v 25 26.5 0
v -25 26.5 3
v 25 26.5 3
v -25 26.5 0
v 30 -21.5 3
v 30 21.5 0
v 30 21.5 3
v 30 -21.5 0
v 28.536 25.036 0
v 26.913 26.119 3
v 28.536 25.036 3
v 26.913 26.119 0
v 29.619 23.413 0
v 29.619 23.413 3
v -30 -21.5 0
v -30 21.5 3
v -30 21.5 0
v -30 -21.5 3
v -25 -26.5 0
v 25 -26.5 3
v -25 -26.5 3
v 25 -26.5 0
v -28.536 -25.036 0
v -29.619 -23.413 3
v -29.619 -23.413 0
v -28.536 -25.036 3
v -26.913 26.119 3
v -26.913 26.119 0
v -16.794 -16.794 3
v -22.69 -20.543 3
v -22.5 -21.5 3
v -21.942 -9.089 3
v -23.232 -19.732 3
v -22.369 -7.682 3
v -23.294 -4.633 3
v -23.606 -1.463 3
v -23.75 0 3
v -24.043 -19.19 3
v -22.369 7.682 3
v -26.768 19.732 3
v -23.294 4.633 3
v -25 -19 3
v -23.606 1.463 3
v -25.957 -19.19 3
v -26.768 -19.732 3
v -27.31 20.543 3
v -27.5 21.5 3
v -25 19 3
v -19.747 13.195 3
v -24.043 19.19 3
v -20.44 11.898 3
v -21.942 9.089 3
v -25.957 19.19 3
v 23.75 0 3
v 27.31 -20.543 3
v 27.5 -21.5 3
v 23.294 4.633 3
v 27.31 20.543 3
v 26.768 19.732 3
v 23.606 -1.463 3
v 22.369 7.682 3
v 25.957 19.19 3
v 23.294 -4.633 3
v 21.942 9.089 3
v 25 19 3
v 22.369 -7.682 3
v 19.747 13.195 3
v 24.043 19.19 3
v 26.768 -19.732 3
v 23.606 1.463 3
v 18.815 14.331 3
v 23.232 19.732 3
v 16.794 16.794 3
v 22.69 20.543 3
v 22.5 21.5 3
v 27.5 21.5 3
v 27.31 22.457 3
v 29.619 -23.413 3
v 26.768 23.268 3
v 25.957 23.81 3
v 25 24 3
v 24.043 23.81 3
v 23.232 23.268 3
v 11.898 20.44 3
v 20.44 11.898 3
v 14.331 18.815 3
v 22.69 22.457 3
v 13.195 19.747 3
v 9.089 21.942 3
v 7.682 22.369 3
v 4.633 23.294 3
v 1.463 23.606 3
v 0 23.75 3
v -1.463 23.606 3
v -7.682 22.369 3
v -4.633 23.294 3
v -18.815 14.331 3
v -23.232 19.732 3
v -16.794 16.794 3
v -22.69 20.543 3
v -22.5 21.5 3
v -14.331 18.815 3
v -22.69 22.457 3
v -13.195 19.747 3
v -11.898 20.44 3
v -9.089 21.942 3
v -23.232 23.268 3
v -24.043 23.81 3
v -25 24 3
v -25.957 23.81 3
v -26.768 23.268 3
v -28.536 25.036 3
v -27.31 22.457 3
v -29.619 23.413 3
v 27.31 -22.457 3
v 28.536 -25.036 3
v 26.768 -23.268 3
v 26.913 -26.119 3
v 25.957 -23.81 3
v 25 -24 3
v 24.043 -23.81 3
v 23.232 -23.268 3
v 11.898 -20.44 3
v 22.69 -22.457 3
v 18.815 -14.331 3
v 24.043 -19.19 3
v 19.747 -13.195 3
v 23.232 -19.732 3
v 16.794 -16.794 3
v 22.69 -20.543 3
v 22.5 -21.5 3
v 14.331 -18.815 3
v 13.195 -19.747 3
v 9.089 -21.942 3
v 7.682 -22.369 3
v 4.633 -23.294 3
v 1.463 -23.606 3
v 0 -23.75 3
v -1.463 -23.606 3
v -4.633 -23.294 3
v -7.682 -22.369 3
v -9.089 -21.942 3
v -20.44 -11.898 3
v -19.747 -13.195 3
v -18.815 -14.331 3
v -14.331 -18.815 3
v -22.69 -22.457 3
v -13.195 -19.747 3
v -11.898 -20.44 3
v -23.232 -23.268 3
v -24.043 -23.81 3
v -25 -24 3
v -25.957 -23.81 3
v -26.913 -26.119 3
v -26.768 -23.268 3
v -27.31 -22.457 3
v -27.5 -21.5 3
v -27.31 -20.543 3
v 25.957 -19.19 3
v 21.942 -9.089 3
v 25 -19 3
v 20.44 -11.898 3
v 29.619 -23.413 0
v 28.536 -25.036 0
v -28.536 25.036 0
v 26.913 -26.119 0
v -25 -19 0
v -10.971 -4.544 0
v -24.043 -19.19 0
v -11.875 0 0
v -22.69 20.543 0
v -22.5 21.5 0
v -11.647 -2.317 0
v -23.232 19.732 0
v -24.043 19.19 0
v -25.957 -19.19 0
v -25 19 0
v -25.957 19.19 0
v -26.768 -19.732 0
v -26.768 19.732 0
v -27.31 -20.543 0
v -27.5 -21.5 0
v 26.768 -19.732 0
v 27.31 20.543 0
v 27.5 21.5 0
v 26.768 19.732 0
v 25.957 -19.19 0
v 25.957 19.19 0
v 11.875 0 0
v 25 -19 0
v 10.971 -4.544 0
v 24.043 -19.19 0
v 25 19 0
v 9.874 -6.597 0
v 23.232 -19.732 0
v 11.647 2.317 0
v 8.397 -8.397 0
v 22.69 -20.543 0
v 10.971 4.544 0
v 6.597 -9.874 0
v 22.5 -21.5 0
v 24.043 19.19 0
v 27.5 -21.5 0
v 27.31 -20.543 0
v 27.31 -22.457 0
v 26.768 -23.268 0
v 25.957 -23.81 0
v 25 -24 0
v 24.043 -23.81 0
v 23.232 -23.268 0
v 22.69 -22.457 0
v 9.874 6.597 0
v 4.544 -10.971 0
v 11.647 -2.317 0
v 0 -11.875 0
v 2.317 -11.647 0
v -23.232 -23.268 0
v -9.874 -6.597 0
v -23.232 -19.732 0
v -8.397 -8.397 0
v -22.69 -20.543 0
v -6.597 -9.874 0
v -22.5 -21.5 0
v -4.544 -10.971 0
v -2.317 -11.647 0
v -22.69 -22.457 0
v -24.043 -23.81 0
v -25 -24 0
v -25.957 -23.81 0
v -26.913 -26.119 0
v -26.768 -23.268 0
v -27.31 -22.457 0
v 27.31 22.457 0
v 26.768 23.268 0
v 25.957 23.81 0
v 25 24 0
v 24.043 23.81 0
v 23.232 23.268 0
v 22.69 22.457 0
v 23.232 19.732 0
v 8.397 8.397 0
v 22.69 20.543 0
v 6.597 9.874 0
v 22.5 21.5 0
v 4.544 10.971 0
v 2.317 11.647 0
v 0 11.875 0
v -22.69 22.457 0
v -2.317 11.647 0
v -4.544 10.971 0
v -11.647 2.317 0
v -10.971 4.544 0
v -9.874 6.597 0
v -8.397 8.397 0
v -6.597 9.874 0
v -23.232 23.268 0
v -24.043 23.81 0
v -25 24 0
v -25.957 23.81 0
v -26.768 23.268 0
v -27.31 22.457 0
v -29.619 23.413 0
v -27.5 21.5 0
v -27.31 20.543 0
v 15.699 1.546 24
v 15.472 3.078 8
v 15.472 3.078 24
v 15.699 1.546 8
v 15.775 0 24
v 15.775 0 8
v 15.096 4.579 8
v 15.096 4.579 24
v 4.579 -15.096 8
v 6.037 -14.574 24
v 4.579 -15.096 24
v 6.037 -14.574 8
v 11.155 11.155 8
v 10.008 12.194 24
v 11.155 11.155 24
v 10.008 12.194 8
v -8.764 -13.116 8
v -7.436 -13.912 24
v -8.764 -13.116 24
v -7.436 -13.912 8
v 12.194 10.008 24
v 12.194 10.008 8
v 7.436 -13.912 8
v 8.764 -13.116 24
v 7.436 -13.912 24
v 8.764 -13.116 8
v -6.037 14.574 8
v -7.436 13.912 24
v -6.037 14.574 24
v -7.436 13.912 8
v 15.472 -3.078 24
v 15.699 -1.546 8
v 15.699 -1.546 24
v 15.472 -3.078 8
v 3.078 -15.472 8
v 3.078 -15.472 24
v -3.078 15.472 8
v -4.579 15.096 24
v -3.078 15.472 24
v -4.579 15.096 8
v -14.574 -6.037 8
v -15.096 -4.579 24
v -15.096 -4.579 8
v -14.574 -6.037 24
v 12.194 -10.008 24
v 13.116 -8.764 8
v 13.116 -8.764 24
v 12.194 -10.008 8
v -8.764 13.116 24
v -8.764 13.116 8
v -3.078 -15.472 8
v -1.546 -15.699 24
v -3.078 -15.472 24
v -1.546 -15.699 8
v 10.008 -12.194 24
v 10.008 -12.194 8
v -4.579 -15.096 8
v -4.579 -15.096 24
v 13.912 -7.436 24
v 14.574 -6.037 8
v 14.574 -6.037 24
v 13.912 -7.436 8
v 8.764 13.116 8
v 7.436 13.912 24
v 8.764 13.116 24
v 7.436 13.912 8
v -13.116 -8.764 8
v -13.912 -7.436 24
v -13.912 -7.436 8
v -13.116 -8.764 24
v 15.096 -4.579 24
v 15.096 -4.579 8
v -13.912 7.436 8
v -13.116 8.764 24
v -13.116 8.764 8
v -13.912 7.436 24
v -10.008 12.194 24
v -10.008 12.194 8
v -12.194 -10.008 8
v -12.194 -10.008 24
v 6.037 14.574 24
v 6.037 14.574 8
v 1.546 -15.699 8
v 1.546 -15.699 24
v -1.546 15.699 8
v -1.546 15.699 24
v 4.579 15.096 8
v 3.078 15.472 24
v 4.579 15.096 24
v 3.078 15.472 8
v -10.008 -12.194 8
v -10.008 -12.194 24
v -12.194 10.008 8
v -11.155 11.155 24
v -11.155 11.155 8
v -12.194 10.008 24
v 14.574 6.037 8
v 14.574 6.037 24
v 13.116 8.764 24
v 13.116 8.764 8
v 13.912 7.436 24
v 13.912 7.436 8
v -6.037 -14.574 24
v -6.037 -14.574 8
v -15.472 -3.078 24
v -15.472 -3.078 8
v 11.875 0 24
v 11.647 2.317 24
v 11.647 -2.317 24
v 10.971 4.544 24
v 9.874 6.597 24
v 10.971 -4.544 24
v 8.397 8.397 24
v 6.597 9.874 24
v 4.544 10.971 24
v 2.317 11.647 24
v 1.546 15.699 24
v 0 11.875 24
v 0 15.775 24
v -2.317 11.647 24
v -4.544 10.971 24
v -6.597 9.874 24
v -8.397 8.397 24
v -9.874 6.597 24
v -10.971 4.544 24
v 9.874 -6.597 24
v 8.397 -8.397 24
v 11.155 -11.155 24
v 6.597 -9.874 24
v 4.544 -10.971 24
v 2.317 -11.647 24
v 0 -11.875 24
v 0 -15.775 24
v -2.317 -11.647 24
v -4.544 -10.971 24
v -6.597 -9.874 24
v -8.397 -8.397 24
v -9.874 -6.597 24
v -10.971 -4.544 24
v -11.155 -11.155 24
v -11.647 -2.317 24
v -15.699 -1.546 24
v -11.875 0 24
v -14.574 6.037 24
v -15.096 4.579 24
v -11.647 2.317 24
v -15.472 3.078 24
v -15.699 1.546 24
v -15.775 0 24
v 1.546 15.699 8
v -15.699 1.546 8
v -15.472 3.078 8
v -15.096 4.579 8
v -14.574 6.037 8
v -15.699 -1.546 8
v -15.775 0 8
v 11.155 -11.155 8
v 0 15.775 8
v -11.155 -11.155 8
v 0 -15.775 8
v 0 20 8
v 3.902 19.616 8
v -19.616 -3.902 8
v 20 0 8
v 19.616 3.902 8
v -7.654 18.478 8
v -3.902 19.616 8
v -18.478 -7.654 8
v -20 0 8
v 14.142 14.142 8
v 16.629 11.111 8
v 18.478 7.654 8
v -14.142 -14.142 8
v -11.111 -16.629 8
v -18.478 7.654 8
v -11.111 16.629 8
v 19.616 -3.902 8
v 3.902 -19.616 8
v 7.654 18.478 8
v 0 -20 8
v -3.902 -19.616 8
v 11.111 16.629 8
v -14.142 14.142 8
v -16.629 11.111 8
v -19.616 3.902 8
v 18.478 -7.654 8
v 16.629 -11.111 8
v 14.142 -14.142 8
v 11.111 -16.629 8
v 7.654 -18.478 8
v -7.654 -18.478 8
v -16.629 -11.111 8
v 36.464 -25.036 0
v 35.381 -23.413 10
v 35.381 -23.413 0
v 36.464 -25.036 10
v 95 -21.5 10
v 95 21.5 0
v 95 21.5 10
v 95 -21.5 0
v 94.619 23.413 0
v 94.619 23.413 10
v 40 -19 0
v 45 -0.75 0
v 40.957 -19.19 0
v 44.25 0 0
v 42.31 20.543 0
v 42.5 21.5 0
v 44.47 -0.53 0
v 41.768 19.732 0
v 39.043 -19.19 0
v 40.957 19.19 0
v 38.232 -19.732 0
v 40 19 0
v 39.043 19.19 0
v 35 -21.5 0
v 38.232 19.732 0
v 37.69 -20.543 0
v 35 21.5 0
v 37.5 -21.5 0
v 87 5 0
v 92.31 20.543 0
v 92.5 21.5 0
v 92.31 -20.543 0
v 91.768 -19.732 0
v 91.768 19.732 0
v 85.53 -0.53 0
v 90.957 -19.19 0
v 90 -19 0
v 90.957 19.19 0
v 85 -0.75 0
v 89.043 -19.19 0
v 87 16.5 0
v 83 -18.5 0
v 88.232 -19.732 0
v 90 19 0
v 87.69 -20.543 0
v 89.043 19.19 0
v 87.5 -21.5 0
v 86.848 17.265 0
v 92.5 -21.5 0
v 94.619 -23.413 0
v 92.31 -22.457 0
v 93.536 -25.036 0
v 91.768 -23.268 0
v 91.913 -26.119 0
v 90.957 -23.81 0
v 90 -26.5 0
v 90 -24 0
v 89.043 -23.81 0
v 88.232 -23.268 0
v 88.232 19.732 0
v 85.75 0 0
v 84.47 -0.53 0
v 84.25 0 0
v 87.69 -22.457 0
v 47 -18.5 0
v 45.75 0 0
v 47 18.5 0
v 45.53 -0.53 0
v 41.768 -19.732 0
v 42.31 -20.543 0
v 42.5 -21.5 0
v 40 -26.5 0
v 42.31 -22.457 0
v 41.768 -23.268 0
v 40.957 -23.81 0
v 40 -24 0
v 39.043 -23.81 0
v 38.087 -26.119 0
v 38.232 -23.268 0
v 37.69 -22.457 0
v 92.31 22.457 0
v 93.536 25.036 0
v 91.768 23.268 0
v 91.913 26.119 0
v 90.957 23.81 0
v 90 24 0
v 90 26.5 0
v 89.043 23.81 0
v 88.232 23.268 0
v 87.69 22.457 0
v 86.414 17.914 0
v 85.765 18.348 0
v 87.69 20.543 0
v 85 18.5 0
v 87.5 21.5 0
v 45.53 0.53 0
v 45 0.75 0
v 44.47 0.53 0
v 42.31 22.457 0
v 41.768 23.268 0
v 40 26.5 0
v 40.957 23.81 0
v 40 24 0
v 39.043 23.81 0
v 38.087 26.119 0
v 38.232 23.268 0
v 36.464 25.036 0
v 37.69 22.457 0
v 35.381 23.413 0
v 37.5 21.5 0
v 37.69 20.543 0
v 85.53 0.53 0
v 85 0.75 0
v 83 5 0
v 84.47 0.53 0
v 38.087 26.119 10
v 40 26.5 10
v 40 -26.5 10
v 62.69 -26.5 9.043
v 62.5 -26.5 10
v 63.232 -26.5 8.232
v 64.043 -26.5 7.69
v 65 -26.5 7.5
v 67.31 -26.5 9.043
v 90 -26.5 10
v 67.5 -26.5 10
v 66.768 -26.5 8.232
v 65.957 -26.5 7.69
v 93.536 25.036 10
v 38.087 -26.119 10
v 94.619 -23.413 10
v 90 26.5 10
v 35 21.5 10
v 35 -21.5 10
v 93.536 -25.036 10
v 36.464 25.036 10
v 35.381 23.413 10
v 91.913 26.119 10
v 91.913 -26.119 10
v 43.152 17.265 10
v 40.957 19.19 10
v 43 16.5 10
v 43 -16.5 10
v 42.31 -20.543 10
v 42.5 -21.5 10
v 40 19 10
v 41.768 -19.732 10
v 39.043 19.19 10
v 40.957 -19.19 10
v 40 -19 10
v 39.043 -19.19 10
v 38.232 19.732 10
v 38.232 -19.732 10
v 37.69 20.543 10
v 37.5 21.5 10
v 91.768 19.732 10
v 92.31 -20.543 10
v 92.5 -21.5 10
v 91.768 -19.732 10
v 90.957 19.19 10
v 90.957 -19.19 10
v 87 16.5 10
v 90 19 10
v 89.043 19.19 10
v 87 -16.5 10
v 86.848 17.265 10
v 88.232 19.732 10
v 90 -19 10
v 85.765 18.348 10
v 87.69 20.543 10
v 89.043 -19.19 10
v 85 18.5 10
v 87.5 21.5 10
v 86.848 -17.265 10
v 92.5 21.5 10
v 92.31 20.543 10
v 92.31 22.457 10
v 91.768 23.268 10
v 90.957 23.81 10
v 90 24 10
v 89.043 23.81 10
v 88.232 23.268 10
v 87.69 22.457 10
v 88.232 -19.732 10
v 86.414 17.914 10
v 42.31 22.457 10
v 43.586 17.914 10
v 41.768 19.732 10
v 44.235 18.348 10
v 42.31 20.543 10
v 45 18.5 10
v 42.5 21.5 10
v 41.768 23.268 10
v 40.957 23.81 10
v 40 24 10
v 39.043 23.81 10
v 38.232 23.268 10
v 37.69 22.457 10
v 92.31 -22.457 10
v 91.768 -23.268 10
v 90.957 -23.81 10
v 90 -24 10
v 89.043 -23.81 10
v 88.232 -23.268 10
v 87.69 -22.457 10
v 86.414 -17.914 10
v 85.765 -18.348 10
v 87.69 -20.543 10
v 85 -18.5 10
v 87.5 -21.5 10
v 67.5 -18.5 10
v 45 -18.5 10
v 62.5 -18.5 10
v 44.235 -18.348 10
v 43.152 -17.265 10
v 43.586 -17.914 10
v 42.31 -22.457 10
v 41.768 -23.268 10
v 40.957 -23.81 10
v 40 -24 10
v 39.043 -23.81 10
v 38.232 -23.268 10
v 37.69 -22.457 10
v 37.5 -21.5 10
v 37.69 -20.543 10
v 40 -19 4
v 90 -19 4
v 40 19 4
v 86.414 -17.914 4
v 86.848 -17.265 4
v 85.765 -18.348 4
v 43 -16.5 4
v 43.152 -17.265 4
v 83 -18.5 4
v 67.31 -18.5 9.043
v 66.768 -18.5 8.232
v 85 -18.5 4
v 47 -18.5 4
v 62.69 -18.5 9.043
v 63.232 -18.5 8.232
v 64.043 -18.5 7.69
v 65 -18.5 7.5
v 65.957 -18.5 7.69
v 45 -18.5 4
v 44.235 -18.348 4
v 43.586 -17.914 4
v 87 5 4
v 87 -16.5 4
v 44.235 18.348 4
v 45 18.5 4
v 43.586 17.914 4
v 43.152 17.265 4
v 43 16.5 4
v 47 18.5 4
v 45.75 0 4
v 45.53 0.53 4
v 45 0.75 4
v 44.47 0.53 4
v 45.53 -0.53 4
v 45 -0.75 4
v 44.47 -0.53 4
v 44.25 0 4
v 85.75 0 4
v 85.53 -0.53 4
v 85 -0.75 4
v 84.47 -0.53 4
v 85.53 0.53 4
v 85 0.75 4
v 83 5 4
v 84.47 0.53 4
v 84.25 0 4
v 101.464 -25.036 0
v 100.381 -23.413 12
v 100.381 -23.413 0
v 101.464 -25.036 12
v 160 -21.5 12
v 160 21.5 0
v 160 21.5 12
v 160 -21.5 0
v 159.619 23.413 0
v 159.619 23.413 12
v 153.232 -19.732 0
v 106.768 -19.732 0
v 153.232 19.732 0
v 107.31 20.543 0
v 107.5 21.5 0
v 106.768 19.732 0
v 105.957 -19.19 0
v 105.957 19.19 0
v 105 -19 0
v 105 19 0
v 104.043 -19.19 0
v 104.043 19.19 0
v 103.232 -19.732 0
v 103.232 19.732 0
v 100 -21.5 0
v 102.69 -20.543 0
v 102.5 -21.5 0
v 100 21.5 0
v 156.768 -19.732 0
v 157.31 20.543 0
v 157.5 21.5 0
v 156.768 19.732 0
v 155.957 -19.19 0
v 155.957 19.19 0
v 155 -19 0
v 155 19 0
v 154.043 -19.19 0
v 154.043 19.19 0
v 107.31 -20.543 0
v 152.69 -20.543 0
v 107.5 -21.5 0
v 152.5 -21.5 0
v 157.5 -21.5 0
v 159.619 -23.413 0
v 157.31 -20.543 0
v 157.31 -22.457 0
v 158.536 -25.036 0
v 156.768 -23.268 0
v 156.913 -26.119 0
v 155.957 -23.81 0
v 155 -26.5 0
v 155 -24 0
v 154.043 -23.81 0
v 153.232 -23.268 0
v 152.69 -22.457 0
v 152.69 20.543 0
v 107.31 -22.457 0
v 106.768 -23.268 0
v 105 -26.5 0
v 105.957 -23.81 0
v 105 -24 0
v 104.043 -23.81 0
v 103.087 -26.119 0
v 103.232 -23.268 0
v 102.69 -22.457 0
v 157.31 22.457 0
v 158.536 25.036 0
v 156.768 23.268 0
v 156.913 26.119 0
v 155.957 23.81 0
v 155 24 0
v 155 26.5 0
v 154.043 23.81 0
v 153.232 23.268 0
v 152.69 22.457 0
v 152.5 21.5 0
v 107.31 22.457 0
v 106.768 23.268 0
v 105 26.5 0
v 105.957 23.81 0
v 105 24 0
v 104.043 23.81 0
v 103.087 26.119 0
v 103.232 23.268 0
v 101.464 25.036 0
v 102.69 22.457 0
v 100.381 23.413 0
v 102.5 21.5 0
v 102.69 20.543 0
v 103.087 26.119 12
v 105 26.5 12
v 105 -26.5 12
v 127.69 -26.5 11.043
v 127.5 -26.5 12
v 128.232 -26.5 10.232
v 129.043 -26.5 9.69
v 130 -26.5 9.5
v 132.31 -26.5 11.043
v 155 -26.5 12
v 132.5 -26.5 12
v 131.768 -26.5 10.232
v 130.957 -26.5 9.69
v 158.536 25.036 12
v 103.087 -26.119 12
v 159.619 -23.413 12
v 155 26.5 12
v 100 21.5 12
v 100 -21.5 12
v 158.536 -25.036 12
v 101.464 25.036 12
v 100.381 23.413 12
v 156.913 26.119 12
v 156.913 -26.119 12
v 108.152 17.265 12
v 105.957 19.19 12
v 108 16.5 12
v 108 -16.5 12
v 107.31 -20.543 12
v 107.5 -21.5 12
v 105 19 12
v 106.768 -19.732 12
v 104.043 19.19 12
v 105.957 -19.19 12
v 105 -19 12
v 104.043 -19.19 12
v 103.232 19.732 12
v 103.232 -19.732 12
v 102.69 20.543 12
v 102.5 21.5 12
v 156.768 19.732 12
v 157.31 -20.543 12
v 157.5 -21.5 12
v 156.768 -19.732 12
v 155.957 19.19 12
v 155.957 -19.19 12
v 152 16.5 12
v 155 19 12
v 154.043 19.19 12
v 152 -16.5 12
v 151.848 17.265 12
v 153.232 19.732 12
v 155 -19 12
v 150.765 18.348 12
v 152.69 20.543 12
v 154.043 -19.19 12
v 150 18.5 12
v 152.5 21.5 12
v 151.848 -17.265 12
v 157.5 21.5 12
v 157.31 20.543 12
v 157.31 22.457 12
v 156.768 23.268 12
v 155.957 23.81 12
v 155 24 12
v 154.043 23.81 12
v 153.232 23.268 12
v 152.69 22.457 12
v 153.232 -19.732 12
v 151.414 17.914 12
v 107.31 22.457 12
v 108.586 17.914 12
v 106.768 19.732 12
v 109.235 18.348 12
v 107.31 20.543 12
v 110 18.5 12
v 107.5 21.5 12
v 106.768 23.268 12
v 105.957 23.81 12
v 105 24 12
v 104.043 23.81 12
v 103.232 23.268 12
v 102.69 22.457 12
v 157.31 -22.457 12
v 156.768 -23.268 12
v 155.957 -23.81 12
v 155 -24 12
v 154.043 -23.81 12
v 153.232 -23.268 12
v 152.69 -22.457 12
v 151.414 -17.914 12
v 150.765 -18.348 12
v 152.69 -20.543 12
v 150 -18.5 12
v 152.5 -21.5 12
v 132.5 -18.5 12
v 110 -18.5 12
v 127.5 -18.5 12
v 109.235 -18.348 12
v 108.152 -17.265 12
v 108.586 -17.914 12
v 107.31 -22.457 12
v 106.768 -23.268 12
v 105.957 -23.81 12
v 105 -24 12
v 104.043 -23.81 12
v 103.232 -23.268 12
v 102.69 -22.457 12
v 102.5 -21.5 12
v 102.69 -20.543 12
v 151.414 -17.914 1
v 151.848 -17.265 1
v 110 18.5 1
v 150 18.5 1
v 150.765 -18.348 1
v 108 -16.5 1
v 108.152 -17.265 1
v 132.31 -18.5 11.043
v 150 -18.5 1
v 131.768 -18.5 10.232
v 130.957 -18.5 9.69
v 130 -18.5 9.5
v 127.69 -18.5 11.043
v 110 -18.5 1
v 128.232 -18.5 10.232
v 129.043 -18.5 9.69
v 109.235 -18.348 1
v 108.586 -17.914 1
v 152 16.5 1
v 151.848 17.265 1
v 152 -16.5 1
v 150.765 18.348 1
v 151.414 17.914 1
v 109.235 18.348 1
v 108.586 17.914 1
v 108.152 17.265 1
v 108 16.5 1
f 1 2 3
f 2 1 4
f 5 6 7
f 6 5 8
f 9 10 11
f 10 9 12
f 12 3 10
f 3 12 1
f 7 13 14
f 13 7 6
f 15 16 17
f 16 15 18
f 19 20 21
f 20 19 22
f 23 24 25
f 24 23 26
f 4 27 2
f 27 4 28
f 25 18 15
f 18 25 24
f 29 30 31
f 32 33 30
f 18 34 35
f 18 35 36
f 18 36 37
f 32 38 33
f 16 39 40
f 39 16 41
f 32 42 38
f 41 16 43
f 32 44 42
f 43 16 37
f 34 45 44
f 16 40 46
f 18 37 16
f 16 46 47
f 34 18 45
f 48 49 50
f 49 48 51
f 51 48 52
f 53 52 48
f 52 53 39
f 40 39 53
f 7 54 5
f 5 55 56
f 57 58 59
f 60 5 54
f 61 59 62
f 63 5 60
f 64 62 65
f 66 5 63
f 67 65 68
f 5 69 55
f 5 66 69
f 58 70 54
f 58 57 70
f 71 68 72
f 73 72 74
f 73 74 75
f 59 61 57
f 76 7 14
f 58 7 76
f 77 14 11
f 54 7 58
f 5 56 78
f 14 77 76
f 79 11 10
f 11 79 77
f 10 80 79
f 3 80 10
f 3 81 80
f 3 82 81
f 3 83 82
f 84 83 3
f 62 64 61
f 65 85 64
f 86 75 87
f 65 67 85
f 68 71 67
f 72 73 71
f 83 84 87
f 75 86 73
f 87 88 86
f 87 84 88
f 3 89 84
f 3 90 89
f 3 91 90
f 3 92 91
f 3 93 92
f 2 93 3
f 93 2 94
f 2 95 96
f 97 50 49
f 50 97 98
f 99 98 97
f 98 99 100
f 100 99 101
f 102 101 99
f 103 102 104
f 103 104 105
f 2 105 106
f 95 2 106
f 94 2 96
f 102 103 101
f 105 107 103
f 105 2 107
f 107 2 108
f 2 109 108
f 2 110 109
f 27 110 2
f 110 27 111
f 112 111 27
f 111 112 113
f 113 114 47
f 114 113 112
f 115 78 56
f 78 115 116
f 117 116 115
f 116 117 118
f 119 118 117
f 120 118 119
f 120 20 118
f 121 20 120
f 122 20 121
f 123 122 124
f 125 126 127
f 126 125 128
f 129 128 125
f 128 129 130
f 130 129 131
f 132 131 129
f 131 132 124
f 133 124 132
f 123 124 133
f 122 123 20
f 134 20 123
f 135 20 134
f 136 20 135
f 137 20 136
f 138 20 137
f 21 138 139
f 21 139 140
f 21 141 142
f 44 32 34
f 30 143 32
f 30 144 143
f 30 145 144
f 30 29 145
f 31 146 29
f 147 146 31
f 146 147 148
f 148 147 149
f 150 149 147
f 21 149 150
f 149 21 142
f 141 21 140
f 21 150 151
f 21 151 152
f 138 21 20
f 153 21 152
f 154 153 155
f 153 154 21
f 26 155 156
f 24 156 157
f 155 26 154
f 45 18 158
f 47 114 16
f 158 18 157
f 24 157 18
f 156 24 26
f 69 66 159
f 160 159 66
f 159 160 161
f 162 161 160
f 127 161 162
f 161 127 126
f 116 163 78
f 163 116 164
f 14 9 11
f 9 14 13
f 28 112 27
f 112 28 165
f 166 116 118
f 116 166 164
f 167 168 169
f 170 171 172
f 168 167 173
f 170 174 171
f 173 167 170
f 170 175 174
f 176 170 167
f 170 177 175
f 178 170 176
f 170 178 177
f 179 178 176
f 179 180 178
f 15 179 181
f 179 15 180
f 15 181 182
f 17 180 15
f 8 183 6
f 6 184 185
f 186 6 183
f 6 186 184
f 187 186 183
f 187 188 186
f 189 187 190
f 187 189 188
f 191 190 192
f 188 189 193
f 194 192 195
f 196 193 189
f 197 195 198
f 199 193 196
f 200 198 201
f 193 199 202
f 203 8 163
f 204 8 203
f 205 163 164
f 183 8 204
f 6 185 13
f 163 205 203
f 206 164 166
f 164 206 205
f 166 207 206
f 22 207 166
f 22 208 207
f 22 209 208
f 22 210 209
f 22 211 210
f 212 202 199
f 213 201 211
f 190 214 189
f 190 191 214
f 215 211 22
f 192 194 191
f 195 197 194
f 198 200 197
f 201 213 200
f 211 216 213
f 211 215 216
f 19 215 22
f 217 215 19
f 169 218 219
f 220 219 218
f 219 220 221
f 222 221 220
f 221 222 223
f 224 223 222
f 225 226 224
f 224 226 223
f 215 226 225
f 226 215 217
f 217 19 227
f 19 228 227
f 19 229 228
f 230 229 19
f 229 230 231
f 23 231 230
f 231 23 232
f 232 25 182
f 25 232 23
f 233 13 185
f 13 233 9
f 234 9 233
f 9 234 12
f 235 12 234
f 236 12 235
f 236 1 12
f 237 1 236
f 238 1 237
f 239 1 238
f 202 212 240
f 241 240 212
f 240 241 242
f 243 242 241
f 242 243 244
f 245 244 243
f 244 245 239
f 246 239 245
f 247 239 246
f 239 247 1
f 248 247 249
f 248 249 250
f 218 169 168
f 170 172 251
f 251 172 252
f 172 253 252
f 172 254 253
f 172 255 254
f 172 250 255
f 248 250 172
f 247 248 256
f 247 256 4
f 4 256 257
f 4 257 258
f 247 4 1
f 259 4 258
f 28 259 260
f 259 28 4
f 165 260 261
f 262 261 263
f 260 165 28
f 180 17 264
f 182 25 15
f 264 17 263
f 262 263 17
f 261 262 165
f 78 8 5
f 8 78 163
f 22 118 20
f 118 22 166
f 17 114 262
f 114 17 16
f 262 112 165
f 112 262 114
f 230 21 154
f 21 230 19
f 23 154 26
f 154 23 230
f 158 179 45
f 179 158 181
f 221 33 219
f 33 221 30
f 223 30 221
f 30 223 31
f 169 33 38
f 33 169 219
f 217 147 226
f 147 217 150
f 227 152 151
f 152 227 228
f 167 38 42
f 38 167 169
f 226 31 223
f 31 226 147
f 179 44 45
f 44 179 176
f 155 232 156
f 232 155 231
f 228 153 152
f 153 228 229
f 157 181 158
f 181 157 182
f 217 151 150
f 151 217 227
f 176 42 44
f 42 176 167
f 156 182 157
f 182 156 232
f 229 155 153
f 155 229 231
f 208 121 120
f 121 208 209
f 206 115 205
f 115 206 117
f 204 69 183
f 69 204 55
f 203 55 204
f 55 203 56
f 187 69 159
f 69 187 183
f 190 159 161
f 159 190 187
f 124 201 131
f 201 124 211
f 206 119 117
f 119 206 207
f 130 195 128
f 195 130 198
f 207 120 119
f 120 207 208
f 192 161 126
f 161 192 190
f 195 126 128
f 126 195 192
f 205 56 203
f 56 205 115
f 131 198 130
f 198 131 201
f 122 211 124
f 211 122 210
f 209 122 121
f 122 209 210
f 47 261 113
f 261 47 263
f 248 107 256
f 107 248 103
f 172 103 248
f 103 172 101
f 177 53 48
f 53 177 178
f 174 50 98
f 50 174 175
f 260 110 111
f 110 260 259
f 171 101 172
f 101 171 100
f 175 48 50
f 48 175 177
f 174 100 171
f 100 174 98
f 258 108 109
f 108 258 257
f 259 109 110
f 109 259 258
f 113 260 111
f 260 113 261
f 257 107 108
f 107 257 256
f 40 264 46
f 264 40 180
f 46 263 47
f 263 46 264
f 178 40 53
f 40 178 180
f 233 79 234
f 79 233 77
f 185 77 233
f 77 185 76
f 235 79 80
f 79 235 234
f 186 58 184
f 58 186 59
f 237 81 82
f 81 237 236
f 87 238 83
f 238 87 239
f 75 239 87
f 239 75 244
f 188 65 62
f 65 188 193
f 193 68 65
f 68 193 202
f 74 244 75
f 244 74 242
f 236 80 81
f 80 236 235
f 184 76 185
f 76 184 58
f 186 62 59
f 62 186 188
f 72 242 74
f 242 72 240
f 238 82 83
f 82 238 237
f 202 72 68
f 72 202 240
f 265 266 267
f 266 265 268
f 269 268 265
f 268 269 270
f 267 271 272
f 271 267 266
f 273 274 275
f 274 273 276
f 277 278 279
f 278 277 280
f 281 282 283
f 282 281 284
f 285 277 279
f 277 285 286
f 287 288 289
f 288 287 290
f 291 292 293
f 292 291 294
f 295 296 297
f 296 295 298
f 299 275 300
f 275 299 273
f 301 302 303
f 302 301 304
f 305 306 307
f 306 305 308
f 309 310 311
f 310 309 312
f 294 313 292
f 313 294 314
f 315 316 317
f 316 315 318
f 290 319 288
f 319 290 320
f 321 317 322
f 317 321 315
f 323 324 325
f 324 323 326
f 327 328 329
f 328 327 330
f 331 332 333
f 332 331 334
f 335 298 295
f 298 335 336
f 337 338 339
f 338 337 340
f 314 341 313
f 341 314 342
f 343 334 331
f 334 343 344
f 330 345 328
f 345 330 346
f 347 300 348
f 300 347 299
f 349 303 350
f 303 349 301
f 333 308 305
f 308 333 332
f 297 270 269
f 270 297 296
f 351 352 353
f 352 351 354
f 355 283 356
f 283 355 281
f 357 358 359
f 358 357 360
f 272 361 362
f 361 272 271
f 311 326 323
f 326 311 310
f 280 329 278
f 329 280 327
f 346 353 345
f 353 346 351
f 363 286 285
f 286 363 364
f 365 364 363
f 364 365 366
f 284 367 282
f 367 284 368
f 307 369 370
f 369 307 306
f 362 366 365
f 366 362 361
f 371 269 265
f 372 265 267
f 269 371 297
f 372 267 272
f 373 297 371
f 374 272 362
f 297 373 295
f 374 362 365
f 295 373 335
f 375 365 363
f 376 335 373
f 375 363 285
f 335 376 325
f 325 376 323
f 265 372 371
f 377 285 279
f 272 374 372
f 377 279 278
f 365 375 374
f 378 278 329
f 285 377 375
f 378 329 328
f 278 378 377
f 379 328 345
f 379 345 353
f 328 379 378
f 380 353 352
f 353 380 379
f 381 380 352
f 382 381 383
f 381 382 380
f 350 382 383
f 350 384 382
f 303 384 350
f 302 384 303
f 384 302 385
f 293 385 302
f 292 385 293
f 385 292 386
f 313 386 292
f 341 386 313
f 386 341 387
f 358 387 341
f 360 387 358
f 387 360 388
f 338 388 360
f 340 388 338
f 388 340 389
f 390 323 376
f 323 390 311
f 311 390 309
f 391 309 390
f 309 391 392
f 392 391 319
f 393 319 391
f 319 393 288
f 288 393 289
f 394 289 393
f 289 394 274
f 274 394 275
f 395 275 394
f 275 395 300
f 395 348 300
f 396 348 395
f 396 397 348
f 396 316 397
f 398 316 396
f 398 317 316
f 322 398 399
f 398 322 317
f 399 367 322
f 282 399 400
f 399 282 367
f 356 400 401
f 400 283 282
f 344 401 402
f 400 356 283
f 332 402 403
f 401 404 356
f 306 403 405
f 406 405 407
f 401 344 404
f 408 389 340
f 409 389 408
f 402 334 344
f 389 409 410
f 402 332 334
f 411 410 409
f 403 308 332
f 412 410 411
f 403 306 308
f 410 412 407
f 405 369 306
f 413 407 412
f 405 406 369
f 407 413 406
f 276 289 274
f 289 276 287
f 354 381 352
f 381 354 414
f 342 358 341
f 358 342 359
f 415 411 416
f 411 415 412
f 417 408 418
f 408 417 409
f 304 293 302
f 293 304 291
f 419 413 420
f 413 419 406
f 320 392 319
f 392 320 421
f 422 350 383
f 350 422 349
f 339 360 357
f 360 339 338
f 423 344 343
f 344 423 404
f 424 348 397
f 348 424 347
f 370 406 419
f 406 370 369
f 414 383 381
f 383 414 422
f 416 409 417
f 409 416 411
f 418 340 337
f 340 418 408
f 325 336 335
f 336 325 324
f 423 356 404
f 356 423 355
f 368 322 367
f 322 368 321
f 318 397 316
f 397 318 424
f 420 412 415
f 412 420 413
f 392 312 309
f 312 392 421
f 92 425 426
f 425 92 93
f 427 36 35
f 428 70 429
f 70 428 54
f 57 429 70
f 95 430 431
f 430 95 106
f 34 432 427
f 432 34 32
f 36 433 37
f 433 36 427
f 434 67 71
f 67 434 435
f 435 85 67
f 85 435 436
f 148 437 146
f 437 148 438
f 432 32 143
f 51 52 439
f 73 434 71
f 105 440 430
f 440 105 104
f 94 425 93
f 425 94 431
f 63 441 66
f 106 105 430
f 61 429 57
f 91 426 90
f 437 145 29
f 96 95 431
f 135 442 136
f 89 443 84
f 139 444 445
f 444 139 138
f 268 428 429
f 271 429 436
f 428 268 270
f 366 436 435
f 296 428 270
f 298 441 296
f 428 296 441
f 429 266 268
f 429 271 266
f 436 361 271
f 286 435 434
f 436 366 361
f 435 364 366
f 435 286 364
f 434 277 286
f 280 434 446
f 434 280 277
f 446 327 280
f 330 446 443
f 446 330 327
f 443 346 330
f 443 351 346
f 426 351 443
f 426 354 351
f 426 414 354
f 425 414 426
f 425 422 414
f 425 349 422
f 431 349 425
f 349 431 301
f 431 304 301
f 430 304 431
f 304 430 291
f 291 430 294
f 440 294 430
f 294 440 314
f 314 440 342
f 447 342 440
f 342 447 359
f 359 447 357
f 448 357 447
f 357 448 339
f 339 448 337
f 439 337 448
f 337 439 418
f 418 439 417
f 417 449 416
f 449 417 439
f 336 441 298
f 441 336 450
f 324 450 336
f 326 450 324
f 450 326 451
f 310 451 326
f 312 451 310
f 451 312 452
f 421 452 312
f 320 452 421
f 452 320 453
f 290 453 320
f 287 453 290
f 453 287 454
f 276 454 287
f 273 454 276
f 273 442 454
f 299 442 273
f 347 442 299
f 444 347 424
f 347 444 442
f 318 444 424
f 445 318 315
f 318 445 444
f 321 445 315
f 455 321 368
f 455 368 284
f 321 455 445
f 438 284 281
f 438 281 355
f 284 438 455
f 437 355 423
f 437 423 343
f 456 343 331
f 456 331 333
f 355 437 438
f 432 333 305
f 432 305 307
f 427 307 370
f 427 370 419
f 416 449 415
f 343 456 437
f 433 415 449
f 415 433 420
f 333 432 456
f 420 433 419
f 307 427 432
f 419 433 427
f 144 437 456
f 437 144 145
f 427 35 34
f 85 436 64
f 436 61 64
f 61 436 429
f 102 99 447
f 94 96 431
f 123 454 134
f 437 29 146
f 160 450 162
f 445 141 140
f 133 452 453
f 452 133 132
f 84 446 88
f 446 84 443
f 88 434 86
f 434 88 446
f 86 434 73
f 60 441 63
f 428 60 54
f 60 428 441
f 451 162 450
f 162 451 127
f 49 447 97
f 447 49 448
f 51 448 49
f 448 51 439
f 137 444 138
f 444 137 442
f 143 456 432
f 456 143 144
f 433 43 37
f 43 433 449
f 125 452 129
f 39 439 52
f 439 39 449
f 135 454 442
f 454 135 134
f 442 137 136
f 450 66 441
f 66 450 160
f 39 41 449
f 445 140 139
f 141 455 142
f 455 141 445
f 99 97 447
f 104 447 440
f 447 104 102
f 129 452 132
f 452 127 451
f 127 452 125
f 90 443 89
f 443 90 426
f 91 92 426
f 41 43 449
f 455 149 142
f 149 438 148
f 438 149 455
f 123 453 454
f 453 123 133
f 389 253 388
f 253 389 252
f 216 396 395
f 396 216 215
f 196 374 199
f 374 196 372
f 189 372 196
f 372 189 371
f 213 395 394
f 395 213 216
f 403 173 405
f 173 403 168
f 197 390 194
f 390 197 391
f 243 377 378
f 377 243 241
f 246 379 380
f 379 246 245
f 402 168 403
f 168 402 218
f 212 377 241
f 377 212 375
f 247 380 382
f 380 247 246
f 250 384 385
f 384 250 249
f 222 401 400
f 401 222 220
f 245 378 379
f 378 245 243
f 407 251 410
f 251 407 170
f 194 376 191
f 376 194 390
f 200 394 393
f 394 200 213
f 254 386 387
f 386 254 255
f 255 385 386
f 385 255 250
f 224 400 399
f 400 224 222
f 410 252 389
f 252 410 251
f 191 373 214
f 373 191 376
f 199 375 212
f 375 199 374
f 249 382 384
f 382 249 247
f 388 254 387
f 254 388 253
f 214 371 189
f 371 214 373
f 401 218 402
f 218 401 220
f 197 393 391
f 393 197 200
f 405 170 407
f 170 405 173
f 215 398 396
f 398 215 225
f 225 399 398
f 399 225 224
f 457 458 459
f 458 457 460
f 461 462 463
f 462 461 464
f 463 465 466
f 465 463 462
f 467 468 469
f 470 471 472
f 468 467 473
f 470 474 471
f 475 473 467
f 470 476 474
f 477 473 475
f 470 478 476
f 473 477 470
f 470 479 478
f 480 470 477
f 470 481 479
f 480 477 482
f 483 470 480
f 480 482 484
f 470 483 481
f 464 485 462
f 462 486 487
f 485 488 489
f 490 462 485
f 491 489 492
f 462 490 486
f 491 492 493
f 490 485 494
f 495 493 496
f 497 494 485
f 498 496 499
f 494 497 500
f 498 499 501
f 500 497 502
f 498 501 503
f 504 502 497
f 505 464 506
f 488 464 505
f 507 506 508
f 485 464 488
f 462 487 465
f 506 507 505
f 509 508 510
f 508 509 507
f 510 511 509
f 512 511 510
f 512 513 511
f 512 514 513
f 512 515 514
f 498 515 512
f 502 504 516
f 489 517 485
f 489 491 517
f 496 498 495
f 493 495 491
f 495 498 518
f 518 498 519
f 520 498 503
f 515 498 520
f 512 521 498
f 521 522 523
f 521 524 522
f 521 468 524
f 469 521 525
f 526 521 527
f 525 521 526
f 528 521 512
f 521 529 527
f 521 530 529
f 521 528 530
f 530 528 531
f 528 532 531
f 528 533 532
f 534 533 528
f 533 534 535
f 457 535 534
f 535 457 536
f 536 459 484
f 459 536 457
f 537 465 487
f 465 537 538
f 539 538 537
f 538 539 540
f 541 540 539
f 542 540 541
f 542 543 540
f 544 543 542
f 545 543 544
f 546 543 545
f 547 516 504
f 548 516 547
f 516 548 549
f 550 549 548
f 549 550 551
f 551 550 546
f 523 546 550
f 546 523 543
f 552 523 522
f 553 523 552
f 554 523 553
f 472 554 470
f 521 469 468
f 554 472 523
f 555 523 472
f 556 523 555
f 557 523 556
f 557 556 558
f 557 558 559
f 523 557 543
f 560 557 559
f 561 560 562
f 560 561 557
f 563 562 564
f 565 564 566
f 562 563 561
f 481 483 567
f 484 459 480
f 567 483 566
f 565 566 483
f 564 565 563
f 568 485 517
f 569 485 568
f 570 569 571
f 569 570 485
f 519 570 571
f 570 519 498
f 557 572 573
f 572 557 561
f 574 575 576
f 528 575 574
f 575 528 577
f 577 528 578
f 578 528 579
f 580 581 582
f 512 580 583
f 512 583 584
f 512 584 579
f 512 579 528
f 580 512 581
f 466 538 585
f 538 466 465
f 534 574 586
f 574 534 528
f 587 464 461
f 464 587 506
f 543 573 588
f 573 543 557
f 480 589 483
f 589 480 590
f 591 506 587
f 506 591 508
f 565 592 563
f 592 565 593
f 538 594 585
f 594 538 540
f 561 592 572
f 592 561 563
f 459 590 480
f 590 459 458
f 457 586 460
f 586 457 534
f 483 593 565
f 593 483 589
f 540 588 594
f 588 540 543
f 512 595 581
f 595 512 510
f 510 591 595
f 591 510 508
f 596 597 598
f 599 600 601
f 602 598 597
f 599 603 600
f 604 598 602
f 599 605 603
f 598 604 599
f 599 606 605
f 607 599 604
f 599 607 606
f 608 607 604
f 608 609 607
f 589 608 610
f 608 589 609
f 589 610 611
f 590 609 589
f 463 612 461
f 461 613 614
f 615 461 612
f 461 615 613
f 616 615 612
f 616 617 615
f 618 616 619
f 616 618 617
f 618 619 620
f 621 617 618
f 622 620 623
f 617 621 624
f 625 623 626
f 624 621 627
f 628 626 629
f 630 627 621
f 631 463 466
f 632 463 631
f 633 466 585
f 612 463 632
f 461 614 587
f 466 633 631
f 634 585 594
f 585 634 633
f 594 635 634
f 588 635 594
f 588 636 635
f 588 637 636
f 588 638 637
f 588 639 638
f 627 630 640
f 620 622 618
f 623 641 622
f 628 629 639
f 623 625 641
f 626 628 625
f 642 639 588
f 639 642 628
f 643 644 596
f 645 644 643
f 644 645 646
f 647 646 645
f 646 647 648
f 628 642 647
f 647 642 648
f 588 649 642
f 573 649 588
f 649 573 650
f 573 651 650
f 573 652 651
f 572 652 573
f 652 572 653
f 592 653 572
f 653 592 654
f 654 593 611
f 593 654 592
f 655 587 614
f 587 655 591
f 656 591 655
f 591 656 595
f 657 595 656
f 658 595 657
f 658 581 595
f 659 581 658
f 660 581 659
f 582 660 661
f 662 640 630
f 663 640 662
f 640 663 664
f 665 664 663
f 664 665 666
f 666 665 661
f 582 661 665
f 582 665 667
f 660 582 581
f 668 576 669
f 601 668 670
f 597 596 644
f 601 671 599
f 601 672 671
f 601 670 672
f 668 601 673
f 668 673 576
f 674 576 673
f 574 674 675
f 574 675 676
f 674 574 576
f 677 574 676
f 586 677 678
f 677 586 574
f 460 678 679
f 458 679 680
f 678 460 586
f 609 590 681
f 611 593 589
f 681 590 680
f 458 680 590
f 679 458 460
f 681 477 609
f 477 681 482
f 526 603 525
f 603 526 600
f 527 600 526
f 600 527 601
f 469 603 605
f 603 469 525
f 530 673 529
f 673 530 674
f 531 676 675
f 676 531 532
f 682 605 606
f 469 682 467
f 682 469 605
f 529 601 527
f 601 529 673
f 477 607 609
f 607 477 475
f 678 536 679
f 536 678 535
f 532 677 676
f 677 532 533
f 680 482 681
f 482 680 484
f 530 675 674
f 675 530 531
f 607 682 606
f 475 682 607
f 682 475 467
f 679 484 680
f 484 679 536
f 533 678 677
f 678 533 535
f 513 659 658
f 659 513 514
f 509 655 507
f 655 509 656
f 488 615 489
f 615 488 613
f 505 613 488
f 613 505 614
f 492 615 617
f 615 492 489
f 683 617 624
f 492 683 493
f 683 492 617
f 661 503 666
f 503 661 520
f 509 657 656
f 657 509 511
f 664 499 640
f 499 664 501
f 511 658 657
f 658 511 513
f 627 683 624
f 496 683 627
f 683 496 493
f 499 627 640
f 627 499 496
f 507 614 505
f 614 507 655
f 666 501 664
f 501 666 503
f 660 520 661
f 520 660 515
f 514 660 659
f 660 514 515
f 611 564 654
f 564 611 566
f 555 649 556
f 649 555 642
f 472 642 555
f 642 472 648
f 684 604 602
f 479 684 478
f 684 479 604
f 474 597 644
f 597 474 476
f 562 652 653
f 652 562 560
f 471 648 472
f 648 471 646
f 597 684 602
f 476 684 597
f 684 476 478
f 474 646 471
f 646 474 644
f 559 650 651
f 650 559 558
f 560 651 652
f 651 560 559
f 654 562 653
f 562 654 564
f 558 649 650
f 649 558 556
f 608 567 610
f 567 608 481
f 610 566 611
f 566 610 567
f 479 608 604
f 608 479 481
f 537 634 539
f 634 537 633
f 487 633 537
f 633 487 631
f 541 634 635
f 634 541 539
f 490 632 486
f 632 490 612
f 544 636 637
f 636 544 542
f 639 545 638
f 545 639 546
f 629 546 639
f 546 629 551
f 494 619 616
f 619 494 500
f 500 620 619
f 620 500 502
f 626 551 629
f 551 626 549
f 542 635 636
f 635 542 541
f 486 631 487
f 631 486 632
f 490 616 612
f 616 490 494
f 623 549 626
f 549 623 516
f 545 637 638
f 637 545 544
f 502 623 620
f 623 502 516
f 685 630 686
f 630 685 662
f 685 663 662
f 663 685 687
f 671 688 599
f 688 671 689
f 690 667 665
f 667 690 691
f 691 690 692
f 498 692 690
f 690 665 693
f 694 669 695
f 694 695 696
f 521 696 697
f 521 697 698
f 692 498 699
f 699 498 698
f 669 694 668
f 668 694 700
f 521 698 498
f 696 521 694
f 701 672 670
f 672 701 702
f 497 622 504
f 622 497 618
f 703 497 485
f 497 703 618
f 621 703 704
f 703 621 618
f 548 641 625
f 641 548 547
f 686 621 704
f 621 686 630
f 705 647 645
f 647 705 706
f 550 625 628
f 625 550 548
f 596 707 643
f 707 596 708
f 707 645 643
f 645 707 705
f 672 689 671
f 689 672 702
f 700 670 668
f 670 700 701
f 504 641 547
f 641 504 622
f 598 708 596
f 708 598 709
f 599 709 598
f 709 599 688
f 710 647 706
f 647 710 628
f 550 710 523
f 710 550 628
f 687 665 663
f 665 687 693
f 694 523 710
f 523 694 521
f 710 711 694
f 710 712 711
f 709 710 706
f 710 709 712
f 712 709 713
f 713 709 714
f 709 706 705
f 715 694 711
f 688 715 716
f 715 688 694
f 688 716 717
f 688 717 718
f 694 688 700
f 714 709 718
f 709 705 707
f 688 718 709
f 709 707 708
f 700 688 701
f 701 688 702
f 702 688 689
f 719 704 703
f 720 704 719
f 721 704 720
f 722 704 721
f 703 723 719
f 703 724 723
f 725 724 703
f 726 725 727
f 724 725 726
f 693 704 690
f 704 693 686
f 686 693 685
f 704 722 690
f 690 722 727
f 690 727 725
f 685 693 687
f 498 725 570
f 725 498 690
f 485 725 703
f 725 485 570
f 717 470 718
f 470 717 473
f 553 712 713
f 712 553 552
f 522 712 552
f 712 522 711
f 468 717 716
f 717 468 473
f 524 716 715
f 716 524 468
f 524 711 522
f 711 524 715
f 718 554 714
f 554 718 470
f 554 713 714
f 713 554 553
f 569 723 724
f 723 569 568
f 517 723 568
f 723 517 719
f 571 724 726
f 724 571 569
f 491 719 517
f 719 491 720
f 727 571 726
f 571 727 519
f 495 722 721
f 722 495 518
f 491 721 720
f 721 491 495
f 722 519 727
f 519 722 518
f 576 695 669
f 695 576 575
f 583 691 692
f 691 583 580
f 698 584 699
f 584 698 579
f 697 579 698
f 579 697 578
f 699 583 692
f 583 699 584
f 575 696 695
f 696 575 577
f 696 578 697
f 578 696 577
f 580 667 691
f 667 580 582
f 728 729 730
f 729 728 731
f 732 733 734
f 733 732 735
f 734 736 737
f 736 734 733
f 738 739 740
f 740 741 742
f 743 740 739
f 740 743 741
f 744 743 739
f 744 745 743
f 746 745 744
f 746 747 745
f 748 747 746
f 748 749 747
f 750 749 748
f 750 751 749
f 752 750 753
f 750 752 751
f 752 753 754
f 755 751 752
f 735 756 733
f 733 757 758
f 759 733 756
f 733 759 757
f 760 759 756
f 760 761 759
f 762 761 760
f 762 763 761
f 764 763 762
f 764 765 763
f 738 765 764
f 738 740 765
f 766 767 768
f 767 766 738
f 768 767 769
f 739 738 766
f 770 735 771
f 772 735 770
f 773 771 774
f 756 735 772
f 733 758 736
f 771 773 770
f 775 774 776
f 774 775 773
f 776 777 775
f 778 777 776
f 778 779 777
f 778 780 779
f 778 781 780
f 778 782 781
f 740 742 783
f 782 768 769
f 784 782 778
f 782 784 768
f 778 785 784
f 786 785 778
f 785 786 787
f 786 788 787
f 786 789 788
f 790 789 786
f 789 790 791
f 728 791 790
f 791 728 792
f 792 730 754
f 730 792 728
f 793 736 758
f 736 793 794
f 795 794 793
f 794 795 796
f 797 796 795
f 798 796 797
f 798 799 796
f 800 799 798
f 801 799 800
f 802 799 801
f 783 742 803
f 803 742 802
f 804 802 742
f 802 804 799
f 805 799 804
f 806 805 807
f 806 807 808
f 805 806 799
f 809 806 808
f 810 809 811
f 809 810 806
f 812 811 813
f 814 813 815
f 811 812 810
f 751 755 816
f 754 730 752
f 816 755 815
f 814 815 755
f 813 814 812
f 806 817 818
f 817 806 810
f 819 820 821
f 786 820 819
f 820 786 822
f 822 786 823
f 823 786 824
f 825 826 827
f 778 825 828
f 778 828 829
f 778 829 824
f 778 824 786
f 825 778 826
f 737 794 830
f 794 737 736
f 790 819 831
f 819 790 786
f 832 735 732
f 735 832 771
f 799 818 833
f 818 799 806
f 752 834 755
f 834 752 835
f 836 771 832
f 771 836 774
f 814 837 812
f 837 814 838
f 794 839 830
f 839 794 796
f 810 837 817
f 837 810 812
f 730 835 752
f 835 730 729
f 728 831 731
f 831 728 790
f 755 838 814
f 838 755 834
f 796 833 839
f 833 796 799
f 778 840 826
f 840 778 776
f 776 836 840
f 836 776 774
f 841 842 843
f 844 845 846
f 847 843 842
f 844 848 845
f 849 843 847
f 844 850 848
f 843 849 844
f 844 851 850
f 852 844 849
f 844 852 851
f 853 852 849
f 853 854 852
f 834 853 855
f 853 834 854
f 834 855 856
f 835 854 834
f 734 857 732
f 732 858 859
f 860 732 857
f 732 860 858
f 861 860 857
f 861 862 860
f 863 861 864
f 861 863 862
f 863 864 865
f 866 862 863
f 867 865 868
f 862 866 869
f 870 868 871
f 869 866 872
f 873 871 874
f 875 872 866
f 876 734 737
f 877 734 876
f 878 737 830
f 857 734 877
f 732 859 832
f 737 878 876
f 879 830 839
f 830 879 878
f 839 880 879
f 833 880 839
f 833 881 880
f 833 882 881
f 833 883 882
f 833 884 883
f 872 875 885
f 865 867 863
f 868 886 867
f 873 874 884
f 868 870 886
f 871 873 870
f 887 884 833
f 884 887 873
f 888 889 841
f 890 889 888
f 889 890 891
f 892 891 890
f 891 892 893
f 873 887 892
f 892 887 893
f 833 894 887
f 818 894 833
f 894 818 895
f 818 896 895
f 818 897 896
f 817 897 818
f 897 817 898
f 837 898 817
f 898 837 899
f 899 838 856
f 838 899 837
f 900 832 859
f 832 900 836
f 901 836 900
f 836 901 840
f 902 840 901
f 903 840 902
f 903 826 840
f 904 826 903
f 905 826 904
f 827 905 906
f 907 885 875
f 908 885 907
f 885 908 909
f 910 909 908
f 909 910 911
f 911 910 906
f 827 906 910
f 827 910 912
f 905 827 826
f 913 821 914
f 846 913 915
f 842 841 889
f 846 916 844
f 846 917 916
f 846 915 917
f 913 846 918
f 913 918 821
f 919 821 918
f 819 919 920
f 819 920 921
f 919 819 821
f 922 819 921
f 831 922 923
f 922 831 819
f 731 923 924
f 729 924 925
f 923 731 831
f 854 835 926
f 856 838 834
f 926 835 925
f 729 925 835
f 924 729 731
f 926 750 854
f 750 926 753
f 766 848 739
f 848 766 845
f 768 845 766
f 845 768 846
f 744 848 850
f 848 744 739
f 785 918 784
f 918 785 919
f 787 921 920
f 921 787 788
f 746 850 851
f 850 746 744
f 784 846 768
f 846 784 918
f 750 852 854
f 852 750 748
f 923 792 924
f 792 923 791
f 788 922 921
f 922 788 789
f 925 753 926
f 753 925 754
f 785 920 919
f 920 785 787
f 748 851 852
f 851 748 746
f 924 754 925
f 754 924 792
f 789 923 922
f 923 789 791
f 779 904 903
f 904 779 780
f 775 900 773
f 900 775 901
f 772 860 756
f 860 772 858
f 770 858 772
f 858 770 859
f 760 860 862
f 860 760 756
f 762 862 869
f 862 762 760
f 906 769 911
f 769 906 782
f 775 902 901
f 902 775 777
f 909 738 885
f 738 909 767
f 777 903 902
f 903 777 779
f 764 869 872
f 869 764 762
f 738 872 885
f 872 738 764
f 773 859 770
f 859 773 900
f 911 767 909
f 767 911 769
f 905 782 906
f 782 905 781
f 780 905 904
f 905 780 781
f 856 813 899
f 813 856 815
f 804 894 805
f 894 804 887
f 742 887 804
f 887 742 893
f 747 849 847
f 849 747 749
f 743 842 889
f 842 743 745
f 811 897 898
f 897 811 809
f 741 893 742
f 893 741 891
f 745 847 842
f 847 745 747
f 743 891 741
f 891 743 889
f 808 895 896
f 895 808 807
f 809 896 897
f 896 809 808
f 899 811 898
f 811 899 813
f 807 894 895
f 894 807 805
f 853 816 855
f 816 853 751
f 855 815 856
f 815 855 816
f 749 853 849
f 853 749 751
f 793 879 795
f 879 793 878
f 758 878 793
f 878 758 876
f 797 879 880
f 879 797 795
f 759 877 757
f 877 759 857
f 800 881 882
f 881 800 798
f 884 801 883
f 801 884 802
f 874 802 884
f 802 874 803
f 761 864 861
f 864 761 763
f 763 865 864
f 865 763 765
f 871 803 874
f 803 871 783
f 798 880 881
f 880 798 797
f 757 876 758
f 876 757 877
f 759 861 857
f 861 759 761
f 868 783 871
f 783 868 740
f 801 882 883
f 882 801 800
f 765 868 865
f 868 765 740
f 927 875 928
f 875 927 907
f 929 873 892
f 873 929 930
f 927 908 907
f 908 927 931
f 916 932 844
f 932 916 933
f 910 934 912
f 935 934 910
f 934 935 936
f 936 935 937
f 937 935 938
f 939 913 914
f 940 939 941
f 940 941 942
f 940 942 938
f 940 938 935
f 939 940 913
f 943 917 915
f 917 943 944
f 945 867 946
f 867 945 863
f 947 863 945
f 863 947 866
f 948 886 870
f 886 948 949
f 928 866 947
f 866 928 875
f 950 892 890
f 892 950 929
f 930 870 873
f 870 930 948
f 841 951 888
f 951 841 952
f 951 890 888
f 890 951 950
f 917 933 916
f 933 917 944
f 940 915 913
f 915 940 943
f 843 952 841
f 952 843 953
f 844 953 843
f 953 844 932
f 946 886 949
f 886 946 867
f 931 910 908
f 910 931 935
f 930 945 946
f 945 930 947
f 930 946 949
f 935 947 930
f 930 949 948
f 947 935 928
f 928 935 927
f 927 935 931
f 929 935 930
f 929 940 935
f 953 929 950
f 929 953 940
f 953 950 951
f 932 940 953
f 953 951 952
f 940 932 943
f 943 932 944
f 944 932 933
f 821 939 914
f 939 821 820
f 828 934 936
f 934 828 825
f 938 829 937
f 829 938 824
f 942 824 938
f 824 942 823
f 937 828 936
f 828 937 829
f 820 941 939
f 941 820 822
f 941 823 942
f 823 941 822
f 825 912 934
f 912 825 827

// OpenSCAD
/*
 * Copyright (C) 2019 Marco Lochen
 *
 * This work is licensed under the Creative Commons Attribution 4.0
 * International License. To view a copy of this license, visit
 * http://creativecommons.org/licenses/by/4.0/ or send a letter to Creative
 * Commons, PO Box 1866, Mountain View, CA 94042, USA.
 */

qinch = 25.4 * 1.25;
width = 60;
height = 53;

module rounded_cube(x, y, z, r)
{
    hull()
    {
        translate([-x / 2 + r, -y / 2 + r, 0]) cylinder(r = r, h = z, $fn = 16);
        translate([x / 2 - r, -y / 2 + r, 0]) cylinder(r = r, h = z, $fn = 16);
        translate([-x / 2 + r, y / 2 - r, 0]) cylinder(r = r, h = z, $fn = 16);
        translate([x / 2 - r, y / 2 - r, 0]) cylinder(r = r, h = z, $fn = 16);
    }
}

module case_layer(h)
{
    difference()
    {
        rounded_cube(width, height, h, 5);
        translate([-width / 2 + 5, -height / 2 + 5, -1]) cylinder(r = 2.5, h = h + 2, $fn = 16);
        translate([width / 2 - 5, -height / 2 + 5, -1]) cylinder(r = 2.5, h = h + 2, $fn = 16);
        translate([-width / 2 + 5, height / 2 - 5, -1]) cylinder(r = 2.5, h = h + 2, $fn = 16);
        translate([width / 2 - 5, height / 2 - 5, -1]) cylinder(r = 2.5, h = h + 2, $fn = 16);
    }
}

module front()
{
    difference()
    {
        union()
        {
            cylinder(r = qinch / 2 - 0.1, h = 24, $fn = 64);
            cylinder(r1 = 26, r2 = 20, h = 8, $fn = 32);
            case_layer(3);
        }
        cylinder(r = qinch / 2 - 4, h = 100, $fn = 32, center = true);
    }
}

module middle()
{
    difference()
    {
        union()
        {
            difference()
            {
                case_layer(10);
                translate([0, 0, -1]) rounded_cube(44, 37, 12, 2);
            }
            translate([-23, 0, 2]) cube([10, 38, 4], center = true);
            translate([23, -7, 2]) cube([10, 24, 4], center = true);
        }
        translate([-20, 0, 0]) cylinder(r = 0.75, h = 20, $fn = 8, center = true);
        translate([20, 0, 0]) cylinder(r = 0.75, h = 20, $fn = 8, center = true);
        translate([0, 0, 10]) rotate([90, 0, 0]) cylinder(r = 2.5, h = 100, $fn = 16);
    }
}

module back()
{
    difference()
    {
        case_layer(12);
        translate([0, 0, 1]) rounded_cube(44, 37, 12, 2);
        translate([0, 0, 12]) rotate([90, 0, 0]) cylinder(r = 2.5, h = 100, $fn = 16);
    }
}

front();
translate([65, 0, 0]) middle();
translate([130, 0, 0]) back();
